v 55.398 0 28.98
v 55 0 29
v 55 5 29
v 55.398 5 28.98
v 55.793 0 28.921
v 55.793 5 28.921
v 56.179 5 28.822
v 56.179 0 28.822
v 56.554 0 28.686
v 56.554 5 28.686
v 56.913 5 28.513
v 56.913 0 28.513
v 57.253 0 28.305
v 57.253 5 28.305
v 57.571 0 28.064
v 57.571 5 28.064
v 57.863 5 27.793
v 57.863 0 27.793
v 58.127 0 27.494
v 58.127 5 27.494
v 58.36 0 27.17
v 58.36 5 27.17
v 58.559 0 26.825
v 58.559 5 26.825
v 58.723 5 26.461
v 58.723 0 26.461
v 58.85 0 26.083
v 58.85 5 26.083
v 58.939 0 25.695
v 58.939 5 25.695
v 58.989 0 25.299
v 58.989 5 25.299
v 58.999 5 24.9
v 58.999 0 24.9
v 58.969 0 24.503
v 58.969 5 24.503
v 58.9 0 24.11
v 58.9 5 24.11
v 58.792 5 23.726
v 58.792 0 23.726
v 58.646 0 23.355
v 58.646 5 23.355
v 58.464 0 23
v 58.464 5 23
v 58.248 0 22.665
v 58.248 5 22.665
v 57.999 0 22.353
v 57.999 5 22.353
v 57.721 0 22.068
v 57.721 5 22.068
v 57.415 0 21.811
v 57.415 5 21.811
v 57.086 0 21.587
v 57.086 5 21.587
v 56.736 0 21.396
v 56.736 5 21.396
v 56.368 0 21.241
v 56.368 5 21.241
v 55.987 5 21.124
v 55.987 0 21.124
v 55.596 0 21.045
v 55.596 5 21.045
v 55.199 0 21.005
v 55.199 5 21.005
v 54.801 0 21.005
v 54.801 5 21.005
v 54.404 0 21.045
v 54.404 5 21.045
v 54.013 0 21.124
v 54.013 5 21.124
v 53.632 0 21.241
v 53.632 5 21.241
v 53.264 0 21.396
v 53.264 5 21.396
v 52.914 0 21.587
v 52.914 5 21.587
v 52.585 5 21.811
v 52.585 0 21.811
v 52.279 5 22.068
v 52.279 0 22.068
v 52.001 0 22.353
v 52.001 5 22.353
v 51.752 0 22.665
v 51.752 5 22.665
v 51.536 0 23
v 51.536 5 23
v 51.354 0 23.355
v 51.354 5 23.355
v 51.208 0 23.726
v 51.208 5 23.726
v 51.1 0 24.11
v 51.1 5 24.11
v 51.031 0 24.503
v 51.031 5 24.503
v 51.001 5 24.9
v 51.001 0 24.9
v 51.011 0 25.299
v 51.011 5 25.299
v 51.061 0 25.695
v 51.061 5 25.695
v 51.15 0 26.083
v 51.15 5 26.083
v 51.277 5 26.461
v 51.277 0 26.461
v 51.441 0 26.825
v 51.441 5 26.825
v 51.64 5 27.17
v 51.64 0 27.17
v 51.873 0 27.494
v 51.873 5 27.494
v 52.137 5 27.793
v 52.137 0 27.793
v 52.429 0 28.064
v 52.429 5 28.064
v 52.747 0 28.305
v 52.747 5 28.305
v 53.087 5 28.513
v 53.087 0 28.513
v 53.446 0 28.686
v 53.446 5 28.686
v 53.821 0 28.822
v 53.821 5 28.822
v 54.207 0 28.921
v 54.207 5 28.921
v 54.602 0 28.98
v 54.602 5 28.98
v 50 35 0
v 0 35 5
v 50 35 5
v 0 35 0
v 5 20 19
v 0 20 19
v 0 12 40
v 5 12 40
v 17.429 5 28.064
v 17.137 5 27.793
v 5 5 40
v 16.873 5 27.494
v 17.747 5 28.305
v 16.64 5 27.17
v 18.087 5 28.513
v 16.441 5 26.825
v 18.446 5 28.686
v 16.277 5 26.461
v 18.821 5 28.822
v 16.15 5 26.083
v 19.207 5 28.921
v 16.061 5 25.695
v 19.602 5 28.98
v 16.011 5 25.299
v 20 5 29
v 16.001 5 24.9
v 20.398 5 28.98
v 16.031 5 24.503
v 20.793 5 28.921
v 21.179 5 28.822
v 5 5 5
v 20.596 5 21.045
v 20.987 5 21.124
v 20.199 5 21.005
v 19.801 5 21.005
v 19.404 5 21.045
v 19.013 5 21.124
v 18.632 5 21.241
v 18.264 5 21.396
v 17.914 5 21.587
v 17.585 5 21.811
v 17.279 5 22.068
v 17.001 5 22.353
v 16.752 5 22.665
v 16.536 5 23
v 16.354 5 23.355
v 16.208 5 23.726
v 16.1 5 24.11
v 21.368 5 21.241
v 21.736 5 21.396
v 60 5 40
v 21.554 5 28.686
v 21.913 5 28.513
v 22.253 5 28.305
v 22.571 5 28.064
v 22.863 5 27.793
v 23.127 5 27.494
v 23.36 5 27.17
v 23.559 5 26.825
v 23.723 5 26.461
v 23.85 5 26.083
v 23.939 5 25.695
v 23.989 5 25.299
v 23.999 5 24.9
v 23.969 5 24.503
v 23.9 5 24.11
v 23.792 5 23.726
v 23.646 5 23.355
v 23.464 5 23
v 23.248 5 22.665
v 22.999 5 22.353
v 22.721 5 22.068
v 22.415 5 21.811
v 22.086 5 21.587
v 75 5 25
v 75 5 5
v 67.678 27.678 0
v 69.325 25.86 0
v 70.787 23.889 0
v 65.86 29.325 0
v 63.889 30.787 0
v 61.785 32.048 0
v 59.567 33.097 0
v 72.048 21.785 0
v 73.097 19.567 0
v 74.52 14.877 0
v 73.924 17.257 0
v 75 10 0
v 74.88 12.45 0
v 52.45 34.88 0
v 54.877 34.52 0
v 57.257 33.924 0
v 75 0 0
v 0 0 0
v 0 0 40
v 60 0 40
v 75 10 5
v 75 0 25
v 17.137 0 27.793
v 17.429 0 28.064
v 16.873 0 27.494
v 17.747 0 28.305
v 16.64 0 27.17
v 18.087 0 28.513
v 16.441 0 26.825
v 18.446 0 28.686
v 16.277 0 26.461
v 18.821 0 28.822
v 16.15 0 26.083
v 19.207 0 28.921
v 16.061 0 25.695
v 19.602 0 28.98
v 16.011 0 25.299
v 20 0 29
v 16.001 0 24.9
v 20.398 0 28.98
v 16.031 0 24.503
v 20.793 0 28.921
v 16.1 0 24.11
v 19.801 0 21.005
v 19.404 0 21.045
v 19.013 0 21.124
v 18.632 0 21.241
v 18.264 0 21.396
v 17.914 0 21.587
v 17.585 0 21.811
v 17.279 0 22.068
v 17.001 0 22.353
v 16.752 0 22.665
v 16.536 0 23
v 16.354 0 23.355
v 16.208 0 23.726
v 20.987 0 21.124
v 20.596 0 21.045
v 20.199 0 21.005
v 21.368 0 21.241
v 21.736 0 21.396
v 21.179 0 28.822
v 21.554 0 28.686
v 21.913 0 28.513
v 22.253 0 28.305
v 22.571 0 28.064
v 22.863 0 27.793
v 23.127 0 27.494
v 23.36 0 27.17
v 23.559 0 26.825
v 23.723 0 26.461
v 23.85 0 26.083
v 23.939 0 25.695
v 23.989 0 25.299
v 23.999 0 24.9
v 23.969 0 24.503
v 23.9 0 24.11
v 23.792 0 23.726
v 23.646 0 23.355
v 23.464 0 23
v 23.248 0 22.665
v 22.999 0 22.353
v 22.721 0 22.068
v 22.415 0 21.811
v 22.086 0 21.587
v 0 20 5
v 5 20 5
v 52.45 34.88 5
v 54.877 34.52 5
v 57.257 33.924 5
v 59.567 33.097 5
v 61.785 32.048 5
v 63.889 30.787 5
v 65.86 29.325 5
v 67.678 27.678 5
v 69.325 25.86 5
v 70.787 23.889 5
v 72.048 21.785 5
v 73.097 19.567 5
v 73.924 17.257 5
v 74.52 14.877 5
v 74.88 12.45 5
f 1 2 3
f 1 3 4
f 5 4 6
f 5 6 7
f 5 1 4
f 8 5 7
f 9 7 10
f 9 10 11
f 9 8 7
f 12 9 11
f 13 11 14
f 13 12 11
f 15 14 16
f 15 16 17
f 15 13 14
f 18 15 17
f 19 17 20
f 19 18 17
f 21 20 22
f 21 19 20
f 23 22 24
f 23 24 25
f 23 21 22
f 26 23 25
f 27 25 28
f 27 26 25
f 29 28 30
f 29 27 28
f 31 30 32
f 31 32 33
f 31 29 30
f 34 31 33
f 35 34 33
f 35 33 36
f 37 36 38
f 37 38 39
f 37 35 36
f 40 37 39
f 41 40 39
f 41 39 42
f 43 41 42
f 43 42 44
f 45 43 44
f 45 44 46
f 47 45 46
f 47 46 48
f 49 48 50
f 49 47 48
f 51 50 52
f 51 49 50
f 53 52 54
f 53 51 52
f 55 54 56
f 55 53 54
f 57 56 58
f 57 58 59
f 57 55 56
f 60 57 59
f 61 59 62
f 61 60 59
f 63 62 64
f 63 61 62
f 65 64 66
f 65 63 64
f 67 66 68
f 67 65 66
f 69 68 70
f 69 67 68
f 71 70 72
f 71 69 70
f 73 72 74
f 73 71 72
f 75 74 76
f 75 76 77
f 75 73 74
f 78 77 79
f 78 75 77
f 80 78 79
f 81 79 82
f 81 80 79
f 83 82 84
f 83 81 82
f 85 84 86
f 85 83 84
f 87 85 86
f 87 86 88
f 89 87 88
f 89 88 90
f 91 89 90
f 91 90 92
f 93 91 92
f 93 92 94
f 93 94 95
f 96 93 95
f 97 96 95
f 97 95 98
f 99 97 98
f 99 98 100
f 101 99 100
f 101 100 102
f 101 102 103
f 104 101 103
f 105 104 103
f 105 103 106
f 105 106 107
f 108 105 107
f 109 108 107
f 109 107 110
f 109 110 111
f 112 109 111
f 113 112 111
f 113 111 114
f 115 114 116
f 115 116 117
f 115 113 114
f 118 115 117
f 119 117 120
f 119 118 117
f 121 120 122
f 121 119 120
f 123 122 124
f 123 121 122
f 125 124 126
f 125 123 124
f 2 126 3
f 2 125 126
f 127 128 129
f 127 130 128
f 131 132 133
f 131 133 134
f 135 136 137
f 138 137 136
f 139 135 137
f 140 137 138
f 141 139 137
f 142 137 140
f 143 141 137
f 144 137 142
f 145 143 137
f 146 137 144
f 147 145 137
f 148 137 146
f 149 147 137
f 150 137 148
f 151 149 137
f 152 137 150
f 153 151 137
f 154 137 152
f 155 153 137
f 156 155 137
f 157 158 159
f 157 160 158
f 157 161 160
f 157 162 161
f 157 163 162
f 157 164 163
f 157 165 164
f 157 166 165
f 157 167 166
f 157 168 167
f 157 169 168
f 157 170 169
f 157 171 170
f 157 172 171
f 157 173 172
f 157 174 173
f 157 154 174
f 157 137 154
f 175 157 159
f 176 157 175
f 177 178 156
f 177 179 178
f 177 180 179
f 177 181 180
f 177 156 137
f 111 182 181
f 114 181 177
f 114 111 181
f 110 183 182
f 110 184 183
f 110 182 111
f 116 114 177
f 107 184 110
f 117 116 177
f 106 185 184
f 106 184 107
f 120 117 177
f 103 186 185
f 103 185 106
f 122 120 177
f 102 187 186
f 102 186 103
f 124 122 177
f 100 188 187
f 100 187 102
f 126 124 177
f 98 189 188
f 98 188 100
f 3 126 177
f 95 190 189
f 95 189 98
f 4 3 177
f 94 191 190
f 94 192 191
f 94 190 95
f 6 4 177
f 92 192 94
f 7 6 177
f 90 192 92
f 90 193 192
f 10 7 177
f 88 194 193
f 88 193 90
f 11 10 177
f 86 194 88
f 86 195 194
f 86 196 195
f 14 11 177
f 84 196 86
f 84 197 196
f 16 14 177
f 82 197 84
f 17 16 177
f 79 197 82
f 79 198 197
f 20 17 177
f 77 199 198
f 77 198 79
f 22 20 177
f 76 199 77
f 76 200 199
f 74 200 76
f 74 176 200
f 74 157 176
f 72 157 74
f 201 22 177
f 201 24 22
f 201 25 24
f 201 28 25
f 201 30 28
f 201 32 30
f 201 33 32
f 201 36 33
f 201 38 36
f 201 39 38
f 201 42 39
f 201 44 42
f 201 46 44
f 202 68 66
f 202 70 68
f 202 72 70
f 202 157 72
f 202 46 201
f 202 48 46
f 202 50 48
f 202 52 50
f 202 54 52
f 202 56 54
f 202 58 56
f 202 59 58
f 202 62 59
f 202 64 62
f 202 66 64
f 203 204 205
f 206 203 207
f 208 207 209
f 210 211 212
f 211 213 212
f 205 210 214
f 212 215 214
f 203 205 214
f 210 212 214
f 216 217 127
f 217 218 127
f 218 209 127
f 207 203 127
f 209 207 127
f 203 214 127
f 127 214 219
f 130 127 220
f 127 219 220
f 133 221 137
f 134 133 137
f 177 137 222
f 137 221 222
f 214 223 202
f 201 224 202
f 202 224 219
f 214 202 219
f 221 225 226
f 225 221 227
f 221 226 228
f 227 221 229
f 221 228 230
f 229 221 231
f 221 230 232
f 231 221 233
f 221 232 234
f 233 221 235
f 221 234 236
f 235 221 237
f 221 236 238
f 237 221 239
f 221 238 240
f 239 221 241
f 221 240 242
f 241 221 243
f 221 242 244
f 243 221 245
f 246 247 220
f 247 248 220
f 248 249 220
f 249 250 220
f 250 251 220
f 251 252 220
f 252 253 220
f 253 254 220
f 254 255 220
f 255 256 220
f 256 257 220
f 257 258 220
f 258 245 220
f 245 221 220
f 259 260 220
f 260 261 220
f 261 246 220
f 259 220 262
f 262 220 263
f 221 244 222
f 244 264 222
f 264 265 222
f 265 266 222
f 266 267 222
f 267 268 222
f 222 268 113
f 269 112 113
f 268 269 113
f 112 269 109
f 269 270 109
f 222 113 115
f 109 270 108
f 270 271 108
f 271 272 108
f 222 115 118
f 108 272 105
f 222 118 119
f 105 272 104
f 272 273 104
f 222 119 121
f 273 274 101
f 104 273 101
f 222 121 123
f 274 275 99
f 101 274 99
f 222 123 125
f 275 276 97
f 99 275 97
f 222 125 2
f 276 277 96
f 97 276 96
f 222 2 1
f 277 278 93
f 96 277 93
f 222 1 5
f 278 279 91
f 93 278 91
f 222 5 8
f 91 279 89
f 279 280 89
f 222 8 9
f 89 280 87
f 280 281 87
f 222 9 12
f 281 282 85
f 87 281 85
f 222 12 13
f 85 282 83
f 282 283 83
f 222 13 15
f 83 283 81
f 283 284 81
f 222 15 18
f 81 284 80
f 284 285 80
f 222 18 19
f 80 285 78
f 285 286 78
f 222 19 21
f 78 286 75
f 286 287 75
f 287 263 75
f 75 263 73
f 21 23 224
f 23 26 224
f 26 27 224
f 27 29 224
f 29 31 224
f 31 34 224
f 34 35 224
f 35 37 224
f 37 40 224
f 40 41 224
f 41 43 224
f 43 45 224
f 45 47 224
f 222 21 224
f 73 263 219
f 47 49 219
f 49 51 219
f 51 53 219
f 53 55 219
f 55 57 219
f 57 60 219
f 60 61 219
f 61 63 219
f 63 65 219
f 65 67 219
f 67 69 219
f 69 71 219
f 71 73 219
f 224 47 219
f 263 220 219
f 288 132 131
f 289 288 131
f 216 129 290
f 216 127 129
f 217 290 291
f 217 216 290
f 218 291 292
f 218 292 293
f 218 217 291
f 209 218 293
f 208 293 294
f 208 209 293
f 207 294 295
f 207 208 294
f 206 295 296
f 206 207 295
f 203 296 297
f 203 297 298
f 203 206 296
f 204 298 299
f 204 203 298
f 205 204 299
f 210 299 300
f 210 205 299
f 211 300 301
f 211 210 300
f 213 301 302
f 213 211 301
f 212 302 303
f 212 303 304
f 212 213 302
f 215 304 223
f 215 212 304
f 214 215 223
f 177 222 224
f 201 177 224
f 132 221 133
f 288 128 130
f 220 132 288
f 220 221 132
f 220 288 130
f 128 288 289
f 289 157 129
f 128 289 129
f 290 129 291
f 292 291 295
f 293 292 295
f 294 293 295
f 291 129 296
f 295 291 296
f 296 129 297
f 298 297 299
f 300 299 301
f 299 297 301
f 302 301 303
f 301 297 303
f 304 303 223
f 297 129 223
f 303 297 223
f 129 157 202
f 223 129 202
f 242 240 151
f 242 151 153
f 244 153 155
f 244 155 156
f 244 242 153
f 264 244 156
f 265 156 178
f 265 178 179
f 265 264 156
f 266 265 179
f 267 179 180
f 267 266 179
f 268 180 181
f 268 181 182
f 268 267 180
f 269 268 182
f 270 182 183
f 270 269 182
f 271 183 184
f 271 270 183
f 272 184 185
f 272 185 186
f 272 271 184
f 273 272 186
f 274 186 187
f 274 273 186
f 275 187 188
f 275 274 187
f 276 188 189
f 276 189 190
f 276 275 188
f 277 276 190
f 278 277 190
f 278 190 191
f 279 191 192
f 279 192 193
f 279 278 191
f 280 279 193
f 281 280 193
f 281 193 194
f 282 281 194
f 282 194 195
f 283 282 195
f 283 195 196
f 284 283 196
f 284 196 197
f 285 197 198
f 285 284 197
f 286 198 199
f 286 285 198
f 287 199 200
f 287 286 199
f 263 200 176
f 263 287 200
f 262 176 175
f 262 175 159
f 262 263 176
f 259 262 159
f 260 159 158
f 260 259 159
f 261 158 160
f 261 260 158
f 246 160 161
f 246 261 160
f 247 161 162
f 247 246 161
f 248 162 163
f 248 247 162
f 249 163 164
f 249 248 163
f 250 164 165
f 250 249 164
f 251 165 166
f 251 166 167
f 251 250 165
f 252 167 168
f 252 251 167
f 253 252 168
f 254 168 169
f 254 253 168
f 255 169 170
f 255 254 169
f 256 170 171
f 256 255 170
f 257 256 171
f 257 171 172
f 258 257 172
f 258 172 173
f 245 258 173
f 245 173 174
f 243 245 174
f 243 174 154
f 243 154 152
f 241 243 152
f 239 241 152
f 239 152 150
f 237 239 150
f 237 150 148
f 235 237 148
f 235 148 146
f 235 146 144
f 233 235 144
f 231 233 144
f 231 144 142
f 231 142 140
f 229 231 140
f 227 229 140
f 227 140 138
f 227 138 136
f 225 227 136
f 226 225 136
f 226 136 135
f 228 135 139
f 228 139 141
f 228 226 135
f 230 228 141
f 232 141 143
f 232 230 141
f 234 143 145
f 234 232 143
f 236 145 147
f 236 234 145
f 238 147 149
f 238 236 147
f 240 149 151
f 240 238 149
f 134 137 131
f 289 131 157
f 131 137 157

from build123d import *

# Parameters (mm, degrees)
SKETCH1_R           = 4
BOSS_EXTRUDE1_DEPTH = 5
BOSS_EXTRUDE2_DEPTH = 35
SKETCH1_4_W         = 5
SKETCH1_4_H         = 35
BOSS_EXTRUDE3_DEPTH = 20
CHAMFER1_SIZE       = 8
CHAMFER1_SIZE2      = 21
FILLET1_R           = 25


with BuildPart() as part:
    # Sketch1 → Boss-Extrude1 (new body)
    with BuildSketch(Plane(origin=(0, 0, 0), x_dir=(1, 0, 0), z_dir=(0, 1, 0))):
        Polygon((5, -5), (5, -40), (60, -40), (75, -25), (75, -5), align=None)
        with Locations((20, -25)):
            Circle(SKETCH1_R, mode=Mode.SUBTRACT)
        with Locations((55, -25)):
            Circle(SKETCH1_R, mode=Mode.SUBTRACT)
    extrude(amount=BOSS_EXTRUDE1_DEPTH)

    # Sketch1<3> → Boss-Extrude2 (add)
    with BuildSketch(Plane(origin=(0, 0, 0), x_dir=(1, 0, 0), z_dir=(0, 1, 0))):
        Polygon((0, -5), (5, -5), (75, -5), (75, 0), (0, 0), align=None)
    extrude(amount=BOSS_EXTRUDE2_DEPTH)

    # Sketch1<4> → Boss-Extrude3 (add)
    with BuildSketch(Plane(origin=(0, 0, 0), x_dir=(1, 0, 0), z_dir=(0, 1, 0))):
        with Locations((2.5, -22.5)):
            Rectangle(SKETCH1_4_W, SKETCH1_4_H)
    extrude(amount=BOSS_EXTRUDE3_DEPTH)

    # Chamfer1
    chamfer1_edges = [part.edges().sort_by_distance(p)[0] for p in [
        (2.5, 20, 40),
    ]]
    chamfer1_side = [part.faces().sort_by_distance(p)[0] for p in [
        (24.5, 4.5, 40),
    ]]
    chamfer(chamfer1_edges, length=CHAMFER1_SIZE, length2=CHAMFER1_SIZE2, reference=chamfer1_side[0])

    # Fillet1
    fillet1_edges = [part.edges().sort_by_distance(p)[0] for p in [
        (75, 35, 2.5),
    ]]
    fillet(fillet1_edges, radius=FILLET1_R)


solid = part.part
